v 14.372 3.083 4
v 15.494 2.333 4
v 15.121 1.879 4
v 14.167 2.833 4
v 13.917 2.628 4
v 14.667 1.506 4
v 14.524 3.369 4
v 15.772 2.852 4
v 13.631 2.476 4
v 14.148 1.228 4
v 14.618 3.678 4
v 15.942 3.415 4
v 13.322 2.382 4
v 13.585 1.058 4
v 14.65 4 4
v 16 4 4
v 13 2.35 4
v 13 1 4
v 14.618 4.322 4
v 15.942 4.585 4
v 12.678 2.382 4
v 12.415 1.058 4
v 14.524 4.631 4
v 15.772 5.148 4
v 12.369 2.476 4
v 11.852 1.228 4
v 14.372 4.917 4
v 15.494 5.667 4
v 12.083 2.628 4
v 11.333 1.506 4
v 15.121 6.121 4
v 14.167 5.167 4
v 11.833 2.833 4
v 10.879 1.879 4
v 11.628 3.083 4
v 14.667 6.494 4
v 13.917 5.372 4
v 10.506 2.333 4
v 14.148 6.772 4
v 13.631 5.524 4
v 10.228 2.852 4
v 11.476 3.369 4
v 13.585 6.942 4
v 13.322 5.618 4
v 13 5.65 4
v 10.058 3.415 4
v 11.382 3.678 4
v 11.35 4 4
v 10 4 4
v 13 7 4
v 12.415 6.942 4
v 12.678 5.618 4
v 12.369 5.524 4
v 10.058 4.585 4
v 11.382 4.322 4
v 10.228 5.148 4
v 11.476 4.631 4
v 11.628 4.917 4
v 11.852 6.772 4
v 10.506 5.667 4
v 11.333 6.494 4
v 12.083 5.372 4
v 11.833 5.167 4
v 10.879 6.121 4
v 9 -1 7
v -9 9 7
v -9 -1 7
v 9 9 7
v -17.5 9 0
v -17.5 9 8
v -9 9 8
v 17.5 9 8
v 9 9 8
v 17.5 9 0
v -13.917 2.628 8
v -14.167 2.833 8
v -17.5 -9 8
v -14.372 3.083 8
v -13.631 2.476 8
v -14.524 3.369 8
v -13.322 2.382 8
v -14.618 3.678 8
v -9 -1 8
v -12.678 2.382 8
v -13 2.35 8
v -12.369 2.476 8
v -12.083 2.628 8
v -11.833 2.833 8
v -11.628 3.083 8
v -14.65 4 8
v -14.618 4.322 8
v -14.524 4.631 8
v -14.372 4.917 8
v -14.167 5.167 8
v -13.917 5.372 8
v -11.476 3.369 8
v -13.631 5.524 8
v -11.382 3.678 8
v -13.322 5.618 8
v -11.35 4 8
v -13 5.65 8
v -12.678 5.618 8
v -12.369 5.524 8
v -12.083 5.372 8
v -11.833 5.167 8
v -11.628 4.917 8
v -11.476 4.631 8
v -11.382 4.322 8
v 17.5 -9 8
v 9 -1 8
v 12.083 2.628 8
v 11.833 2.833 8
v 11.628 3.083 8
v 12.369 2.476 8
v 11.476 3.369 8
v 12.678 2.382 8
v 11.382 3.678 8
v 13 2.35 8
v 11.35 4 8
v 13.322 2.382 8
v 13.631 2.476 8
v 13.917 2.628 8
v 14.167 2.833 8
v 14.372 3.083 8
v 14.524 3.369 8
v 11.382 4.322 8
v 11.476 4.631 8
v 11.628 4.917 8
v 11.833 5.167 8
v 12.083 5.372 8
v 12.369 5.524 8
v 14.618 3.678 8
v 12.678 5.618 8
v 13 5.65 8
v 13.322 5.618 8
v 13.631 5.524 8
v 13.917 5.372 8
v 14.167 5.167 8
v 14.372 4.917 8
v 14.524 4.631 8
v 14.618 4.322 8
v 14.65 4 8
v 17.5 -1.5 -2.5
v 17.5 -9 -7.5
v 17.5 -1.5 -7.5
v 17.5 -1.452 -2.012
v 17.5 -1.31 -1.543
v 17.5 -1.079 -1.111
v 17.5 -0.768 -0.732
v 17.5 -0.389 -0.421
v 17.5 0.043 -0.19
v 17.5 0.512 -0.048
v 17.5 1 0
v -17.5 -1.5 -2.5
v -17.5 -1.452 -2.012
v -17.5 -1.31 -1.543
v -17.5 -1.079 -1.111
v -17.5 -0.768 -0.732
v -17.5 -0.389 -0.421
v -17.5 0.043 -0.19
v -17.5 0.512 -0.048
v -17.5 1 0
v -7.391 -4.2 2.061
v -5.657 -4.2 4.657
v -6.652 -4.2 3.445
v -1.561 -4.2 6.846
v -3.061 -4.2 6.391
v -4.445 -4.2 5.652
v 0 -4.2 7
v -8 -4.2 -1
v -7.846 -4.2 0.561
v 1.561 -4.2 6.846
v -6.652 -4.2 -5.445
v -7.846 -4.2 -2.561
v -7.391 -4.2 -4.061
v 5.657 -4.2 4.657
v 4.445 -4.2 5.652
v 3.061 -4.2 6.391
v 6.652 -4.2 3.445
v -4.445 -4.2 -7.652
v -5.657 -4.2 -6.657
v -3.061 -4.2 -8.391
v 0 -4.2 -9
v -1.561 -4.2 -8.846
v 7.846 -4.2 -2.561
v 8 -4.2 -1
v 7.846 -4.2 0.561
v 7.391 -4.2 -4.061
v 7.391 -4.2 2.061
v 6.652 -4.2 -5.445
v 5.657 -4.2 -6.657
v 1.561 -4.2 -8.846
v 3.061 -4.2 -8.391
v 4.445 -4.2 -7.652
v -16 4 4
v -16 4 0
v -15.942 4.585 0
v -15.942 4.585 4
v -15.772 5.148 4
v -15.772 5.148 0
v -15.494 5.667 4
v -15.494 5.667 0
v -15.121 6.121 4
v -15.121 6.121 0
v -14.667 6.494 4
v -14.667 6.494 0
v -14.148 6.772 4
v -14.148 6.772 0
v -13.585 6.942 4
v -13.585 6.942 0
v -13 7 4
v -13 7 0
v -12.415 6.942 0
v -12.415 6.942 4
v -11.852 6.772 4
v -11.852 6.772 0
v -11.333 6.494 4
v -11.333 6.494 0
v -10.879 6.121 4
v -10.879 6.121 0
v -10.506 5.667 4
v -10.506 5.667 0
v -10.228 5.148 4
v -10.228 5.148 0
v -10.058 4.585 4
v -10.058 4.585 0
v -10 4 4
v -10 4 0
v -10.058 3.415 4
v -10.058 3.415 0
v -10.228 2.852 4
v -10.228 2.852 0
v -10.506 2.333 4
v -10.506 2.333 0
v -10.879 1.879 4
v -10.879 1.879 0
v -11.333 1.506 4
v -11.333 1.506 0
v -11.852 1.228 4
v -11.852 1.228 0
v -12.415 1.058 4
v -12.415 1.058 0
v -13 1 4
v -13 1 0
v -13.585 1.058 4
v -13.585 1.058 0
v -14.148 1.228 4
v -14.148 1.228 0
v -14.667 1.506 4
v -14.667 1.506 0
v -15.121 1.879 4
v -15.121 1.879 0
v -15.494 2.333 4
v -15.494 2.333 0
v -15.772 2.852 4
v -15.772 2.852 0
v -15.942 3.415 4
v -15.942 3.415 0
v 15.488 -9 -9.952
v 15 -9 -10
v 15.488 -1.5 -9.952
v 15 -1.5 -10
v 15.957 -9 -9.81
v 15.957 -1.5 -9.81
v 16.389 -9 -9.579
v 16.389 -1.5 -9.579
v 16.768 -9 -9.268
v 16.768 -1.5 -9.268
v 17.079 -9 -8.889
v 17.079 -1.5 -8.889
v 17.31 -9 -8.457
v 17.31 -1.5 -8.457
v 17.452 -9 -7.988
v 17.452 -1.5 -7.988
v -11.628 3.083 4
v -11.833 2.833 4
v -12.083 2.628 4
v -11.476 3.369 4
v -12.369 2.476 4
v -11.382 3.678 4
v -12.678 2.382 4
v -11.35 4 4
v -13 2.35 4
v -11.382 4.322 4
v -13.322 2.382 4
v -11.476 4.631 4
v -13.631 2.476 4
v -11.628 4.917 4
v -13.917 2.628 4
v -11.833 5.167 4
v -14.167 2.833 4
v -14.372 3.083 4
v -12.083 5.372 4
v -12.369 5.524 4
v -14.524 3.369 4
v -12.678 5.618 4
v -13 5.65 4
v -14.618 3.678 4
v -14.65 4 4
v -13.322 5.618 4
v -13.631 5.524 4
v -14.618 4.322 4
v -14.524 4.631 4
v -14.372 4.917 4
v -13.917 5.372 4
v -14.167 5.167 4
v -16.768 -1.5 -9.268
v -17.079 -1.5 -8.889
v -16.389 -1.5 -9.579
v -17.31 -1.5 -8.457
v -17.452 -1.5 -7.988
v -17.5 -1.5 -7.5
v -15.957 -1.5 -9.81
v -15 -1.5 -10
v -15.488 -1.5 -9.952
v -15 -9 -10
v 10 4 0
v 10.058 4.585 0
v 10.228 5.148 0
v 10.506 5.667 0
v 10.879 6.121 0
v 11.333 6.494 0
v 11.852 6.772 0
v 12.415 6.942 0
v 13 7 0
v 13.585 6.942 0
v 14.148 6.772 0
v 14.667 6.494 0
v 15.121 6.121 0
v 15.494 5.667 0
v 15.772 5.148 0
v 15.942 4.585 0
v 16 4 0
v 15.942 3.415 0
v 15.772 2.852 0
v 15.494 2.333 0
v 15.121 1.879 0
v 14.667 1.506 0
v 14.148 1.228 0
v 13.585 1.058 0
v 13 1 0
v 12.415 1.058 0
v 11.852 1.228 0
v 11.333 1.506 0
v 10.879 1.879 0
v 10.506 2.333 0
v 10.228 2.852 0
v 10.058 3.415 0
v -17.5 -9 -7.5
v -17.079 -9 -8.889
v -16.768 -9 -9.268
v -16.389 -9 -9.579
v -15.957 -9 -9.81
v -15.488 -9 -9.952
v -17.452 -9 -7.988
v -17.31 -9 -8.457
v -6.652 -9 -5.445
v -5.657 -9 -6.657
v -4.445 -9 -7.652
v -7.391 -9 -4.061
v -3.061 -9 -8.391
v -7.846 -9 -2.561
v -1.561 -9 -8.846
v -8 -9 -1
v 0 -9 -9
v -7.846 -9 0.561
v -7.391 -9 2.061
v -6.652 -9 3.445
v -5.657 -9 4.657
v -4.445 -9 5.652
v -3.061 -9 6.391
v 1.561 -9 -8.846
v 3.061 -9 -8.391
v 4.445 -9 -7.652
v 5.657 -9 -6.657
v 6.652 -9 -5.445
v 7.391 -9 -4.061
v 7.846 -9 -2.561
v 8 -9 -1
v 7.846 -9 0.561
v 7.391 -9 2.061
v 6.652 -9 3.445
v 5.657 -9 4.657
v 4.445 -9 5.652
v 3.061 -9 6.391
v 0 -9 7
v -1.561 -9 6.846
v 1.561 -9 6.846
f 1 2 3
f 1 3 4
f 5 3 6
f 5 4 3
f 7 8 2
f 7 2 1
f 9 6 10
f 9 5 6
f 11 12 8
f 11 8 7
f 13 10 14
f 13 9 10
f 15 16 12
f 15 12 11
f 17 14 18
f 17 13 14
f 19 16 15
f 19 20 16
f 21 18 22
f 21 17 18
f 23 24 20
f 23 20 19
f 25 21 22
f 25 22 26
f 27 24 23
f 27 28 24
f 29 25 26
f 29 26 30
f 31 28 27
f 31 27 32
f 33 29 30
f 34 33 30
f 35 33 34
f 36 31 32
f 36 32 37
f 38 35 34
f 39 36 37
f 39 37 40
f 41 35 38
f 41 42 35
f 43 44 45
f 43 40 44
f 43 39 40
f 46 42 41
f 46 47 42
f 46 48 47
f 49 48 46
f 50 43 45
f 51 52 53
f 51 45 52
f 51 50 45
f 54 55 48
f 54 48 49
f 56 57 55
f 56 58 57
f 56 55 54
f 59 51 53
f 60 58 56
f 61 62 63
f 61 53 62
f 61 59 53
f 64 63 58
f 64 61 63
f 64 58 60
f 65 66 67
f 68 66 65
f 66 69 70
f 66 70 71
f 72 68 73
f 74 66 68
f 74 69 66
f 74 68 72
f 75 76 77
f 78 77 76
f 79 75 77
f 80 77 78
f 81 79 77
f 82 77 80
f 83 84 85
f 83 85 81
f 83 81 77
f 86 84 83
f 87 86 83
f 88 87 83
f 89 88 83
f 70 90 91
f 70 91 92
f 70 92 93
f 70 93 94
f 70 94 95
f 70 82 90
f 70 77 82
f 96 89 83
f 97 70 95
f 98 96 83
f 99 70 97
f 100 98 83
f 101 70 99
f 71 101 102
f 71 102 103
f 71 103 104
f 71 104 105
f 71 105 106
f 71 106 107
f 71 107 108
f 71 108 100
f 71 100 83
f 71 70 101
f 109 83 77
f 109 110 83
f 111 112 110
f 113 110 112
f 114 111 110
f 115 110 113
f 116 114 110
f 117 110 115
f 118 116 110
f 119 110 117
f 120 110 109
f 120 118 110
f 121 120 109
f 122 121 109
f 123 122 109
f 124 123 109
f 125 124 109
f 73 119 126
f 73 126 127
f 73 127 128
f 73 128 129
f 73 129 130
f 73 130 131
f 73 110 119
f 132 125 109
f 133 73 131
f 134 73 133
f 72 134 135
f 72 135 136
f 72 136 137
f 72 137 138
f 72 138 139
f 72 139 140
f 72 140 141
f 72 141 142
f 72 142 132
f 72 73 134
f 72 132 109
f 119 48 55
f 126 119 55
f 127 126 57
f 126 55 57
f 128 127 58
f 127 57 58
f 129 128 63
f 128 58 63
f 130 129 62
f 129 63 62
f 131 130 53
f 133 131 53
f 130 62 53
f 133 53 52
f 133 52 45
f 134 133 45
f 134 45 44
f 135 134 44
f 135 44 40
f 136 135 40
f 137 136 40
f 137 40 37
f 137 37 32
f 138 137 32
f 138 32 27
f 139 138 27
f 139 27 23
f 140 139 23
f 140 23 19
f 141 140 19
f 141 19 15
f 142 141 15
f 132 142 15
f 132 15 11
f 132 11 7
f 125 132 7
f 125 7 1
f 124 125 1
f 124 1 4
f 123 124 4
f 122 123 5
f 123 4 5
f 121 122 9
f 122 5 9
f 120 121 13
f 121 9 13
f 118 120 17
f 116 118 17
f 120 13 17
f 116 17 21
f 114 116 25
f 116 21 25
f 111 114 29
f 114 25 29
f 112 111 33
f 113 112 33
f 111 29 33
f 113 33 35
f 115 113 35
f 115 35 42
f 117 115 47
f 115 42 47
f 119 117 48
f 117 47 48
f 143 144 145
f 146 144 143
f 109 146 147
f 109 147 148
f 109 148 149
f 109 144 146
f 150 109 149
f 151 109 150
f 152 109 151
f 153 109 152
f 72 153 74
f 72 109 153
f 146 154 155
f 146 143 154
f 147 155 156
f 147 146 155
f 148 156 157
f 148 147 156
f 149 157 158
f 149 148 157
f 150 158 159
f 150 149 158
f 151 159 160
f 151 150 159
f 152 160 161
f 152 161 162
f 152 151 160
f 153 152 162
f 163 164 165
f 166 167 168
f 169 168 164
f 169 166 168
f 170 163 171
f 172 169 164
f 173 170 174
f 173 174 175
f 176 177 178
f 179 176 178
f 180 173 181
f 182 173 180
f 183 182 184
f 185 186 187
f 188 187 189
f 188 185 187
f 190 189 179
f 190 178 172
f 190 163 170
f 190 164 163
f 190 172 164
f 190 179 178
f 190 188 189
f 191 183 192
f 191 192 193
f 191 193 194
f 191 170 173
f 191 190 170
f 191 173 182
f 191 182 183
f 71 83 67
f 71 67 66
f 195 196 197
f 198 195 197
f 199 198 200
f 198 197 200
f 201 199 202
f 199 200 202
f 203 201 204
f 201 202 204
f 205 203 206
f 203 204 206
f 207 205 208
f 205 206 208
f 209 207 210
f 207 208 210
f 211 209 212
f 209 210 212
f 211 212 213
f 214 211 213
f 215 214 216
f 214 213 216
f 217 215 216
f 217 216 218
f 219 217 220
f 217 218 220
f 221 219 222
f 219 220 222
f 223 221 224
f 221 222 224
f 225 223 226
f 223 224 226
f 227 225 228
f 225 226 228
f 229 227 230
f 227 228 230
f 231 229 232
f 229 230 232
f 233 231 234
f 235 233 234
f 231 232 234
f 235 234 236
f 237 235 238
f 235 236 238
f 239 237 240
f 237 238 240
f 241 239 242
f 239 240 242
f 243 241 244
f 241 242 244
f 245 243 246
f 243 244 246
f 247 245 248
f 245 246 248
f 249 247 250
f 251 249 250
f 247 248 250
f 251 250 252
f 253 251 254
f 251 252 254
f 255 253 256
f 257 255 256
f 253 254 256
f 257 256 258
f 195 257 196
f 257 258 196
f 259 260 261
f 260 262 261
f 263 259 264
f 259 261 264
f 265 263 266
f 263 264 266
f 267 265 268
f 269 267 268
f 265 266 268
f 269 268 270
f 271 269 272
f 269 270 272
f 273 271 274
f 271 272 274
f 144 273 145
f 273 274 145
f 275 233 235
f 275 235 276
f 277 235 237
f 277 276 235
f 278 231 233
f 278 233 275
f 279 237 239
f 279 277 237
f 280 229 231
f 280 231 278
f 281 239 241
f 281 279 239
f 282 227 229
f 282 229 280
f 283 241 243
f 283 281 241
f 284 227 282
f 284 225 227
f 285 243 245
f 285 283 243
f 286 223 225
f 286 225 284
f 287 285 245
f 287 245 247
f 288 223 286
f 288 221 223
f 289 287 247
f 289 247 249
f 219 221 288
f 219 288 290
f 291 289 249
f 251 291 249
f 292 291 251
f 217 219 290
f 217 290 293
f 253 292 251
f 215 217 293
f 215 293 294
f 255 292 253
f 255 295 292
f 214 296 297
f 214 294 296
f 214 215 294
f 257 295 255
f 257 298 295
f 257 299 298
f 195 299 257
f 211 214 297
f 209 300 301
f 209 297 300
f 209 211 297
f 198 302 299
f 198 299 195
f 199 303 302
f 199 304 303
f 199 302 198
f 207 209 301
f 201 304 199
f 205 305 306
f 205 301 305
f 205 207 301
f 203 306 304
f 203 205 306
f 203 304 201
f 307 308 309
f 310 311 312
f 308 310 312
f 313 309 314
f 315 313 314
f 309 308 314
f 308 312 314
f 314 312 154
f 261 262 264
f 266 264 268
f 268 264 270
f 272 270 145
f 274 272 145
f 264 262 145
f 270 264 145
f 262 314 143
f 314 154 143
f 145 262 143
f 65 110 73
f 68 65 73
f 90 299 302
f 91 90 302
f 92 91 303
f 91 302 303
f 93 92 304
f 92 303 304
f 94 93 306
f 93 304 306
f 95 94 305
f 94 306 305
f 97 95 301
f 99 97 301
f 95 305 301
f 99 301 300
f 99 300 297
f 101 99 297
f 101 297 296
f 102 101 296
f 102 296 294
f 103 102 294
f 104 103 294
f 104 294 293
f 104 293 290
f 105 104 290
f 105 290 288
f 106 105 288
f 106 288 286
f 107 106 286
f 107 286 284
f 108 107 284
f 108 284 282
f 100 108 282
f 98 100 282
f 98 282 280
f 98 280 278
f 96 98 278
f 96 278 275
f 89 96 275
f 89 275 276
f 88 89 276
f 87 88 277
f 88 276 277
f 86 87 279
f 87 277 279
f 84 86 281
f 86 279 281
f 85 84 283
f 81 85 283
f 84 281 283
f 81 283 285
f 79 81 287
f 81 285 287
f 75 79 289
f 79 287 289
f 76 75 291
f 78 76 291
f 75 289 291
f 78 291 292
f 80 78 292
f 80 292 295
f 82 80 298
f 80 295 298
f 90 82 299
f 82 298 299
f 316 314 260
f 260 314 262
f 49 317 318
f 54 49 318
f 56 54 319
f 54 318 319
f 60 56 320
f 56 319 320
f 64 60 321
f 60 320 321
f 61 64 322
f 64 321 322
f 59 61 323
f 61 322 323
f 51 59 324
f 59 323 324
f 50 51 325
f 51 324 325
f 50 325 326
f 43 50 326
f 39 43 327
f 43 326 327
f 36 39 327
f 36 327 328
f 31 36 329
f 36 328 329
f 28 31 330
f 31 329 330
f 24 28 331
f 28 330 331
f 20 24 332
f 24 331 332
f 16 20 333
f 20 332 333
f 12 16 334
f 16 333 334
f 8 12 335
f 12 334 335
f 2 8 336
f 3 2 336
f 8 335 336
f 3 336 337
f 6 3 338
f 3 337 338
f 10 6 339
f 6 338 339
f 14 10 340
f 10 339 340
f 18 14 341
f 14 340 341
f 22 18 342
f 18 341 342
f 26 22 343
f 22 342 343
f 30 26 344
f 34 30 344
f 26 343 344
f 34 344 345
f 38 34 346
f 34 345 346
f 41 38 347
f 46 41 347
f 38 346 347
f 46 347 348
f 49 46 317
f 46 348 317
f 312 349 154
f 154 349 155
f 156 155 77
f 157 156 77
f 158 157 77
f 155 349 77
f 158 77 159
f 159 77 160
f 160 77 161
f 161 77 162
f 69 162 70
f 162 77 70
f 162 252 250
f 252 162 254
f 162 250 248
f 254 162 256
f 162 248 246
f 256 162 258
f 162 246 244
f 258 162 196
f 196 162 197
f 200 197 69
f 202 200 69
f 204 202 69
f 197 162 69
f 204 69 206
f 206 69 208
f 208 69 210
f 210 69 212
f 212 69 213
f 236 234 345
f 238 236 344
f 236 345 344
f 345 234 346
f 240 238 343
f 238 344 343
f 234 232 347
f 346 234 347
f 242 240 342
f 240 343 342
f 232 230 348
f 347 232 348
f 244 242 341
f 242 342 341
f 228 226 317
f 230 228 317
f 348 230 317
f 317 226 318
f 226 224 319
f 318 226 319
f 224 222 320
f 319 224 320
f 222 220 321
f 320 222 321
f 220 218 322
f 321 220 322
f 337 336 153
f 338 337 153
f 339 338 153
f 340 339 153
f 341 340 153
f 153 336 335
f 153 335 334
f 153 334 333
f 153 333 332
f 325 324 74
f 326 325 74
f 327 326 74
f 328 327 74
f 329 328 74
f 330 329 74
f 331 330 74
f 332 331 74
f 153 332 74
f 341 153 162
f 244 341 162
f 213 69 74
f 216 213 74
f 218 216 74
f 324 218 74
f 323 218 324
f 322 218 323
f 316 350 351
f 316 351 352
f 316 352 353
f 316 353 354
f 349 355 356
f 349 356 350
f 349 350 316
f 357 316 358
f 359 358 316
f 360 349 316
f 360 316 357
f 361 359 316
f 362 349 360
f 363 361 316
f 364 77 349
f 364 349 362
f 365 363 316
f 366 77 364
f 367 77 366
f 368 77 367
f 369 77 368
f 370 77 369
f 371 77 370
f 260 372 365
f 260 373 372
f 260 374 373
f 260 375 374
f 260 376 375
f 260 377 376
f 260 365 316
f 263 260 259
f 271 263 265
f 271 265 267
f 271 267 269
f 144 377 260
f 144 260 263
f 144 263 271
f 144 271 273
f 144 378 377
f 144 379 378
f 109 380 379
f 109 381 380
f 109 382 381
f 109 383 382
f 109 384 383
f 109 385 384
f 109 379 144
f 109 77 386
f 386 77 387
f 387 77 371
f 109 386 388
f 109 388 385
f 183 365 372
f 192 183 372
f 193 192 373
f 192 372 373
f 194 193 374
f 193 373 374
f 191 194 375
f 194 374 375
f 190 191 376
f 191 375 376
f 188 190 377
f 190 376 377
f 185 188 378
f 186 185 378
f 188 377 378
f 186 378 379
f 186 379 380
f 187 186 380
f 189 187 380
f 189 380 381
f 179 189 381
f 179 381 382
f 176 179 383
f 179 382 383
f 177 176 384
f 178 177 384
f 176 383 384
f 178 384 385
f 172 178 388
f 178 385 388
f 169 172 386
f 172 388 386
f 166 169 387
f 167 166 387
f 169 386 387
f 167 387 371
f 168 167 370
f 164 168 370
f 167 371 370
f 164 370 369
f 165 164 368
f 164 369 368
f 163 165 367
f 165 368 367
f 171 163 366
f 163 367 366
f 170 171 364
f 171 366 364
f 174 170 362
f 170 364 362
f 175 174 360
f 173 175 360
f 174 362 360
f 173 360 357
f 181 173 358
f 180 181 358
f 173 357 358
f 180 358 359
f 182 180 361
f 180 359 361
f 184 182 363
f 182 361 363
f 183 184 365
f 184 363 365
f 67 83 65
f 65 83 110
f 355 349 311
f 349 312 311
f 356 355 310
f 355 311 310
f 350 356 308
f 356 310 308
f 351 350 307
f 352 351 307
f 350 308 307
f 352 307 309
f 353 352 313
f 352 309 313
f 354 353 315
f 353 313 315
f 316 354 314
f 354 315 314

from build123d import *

# Parameters (mm, degrees)
SKETCH1_W           = 35
SKETCH1_H           = 18
BOSS_EXTRUDE1_DEPTH = 8
SKETCH4_W           = 18
SKETCH4_H           = 10
CUT_EXTRUDE3_DEPTH  = 1
CUT_EXTRUDE2_REACH  = 23.243
SKETCH3_R           = 1.65
SKETCH5_R           = 3
CUT_EXTRUDE4_DEPTH  = 4
SKETCH6_W           = 35
SKETCH6_H           = 7.5
BOSS_EXTRUDE2_DEPTH = 10
SKETCH7_R           = 8
CUT_EXTRUDE5_DEPTH  = 4.8
FILLET1_R           = 2.5


with BuildPart() as part:
    # Sketch1 → Boss-Extrude1 (new body)
    with BuildSketch(Plane.XY):
        Rectangle(SKETCH1_W, SKETCH1_H)
    extrude(amount=BOSS_EXTRUDE1_DEPTH)

    # Sketch4 → Cut-Extrude3 (cut)
    with BuildSketch(Plane.XY.offset(8)):
        with Locations((0, 4)):
            Rectangle(SKETCH4_W, SKETCH4_H)
    extrude(amount=-CUT_EXTRUDE3_DEPTH, mode=Mode.SUBTRACT)

    # Sketch3 → Cut-Extrude2 (cut, up to next)
    with BuildSketch(Plane(origin=(0, 0, 0), x_dir=(-1, 0, 0), z_dir=(0, 0, -1)), mode=Mode.PRIVATE) as cut_extrude2_sk1:
        with Locations((-13, 4)):
            Circle(SKETCH3_R)
    cut_extrude2_tool1 = extrude(cut_extrude2_sk1.sketch, amount=-CUT_EXTRUDE2_REACH, mode=Mode.PRIVATE) & part.part
    # Sketch3 → Cut-Extrude2 (cut, up to next)
    with BuildSketch(Plane(origin=(0, 0, 0), x_dir=(-1, 0, 0), z_dir=(0, 0, -1)), mode=Mode.PRIVATE) as cut_extrude2_sk2:
        with Locations((13, 4)):
            Circle(SKETCH3_R)
    cut_extrude2_tool2 = extrude(cut_extrude2_sk2.sketch, amount=-CUT_EXTRUDE2_REACH, mode=Mode.PRIVATE) & part.part
    add(cut_extrude2_tool1.solids().sort_by_distance((13, 4, 0))[0], mode=Mode.SUBTRACT)
    add(cut_extrude2_tool2.solids().sort_by_distance((-13, 4, 0))[0], mode=Mode.SUBTRACT)

    # Sketch5 → Cut-Extrude4 (cut)
    with BuildSketch(Plane(origin=(0, 0, 0), x_dir=(-1, 0, 0), z_dir=(0, 0, -1))):
        with Locations((-13, 4)):
            Circle(SKETCH5_R)
        with Locations((13, 4)):
            Circle(SKETCH5_R)
    extrude(amount=-CUT_EXTRUDE4_DEPTH, mode=Mode.SUBTRACT)

    # Sketch6 → Boss-Extrude2 (add)
    with BuildSketch(Plane.XY):
        with Locations((0, -5.25)):
            Rectangle(SKETCH6_W, SKETCH6_H)
    extrude(amount=-BOSS_EXTRUDE2_DEPTH)

    # Sketch7 → Cut-Extrude5 (cut)
    with BuildSketch(Plane(origin=(0, -9, 0), x_dir=(-1, 0, 0), z_dir=(0, -1, 0))):
        with Locations(Location((0, 1, 0), (0, 0, 90))):
            Circle(SKETCH7_R)
    extrude(amount=-CUT_EXTRUDE5_DEPTH, mode=Mode.SUBTRACT)

    # Fillet1
    fillet1_edges = [part.edges().sort_by_distance(p)[0] for p in [
        (17.5, -5.25, -10),
        (-17.5, -5.25, -10),
        (0, -1.5, 0),
    ]]
    fillet(fillet1_edges, radius=FILLET1_R - 0.0001)  # a hair under: the kernel refuses the full size


solid = part.part
